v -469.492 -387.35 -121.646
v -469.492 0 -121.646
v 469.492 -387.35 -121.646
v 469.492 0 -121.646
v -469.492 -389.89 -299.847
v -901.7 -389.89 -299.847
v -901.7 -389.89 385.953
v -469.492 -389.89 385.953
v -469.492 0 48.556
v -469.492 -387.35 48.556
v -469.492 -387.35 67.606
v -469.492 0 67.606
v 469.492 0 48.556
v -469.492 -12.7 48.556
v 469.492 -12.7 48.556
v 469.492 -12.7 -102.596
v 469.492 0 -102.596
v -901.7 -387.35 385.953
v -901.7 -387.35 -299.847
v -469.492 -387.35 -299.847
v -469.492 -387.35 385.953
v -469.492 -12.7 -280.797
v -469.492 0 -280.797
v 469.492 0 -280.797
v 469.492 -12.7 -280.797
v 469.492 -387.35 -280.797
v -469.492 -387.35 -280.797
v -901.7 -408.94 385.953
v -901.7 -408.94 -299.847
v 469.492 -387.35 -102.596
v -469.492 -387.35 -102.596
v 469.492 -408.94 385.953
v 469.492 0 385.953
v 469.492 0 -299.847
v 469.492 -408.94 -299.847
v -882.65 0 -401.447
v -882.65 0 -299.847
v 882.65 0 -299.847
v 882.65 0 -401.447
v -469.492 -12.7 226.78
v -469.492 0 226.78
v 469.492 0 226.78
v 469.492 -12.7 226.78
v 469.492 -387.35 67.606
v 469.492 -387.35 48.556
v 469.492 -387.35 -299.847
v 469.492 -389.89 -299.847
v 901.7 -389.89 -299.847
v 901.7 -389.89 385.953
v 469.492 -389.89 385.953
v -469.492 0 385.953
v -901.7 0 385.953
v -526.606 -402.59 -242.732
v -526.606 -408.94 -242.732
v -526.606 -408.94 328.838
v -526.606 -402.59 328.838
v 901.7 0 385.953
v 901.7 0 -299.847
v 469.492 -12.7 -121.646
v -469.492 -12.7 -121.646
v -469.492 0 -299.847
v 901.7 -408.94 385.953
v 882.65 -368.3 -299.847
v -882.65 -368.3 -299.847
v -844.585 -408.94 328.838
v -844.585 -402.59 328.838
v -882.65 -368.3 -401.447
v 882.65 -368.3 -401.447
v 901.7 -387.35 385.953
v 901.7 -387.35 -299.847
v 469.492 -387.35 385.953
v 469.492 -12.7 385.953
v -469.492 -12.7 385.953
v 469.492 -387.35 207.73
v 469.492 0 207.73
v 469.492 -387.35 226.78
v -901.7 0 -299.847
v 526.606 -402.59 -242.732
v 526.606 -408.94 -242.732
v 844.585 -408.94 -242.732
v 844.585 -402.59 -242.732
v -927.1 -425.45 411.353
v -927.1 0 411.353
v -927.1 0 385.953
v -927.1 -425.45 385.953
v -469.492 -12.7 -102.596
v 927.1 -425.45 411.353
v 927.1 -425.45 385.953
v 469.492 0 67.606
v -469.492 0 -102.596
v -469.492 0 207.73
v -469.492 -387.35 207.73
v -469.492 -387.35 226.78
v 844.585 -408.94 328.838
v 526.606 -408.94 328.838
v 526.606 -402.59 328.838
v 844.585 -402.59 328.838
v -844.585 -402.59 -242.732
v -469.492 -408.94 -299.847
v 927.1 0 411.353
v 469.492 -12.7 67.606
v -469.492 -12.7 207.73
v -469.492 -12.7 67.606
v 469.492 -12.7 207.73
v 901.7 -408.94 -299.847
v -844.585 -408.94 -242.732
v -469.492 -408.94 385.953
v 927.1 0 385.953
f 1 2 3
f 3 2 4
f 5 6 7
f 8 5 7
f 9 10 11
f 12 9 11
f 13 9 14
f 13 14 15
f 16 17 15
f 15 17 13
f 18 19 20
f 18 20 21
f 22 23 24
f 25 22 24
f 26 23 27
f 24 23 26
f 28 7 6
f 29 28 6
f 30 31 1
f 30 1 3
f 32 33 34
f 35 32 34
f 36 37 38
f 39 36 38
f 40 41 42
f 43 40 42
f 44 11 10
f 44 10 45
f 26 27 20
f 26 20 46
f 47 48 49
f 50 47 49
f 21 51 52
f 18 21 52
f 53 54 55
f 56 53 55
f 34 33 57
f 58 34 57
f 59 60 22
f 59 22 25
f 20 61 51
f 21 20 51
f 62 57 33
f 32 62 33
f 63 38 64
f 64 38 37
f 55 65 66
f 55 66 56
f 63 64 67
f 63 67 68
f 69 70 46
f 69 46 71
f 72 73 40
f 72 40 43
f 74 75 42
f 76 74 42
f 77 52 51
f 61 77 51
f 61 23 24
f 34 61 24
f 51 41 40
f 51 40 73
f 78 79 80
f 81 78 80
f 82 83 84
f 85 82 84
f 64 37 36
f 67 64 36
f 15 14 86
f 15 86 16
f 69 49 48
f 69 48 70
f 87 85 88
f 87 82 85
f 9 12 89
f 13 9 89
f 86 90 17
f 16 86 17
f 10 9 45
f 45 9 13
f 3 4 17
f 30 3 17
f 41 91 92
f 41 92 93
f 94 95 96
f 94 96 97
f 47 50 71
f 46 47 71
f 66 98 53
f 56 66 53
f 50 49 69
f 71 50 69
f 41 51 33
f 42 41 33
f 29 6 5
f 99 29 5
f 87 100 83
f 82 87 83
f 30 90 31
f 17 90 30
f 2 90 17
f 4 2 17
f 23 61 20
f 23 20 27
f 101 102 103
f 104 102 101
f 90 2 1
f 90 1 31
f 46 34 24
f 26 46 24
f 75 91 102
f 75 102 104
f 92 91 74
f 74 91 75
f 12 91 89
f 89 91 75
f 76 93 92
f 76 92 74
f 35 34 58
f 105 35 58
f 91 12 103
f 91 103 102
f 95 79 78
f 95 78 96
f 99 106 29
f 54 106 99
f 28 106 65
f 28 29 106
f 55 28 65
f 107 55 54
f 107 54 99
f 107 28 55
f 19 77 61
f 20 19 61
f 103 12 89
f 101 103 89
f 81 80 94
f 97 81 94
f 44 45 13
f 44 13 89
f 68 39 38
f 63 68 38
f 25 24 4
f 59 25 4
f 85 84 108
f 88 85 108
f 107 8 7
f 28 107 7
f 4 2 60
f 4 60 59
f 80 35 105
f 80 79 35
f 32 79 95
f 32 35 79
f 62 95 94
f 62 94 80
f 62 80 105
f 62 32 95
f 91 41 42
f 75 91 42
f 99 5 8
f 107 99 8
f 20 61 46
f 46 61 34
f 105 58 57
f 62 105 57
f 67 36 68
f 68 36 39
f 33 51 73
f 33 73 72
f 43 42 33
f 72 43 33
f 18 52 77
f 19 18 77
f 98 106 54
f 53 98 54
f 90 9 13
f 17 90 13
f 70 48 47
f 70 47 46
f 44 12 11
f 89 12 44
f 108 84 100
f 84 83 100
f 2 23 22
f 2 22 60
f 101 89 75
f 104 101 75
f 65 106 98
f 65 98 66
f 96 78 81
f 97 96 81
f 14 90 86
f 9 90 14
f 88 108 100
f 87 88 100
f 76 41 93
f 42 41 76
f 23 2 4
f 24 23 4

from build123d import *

# Parameters (mm, degrees)
F0_W      = 317.978578
F0_H      = 571.570131
F1_DEPTH  = 408.94
F0_W_2    = 938.983108
F0_H_2    = 19.05
F2_DEPTH  = 387.35
F3_DEPTH  = 425.45
F4_W      = 2.54
F4_H      = 685.8
F5_DEPTH  = 432.208446
F6_W      = 2.54
F6_H      = 685.8
F7_DEPTH  = 432.208446
F8_DEPTH  = 368.3
F0_H_3    = 159.172786
F0_H_4    = 140.123955
F0_H_5    = 151.15178
F0_H_6    = 159.151479
F9_DEPTH  = 12.7
F10_W     = 317.978578
F10_H     = 571.570131
F11_DEPTH = 6.35


with BuildPart() as f1:
    # F0 (on Front) → F1 (new body)
    with BuildSketch(Plane.XZ):
        Polygon((-469.491554, 385.952815), (-901.7, 385.952815), (-901.7, -299.847185), (-882.65, -299.847185), (-469.491554, -299.847185), (-469.491554, -280.797185), (-469.491554, -121.645706), (-469.491554, -102.595706), (-469.491554, 48.556074), (-469.491554, 67.606074), (-469.491554, 207.730029), (-469.491554, 226.780029), align=None)
        with Locations((-685.595777, 43.052815)):
            Rectangle(F0_W, F0_H, mode=Mode.SUBTRACT)
        Polygon((901.7, 385.952815), (469.491554, 385.952815), (469.491554, 226.780029), (469.491554, 207.730029), (469.491554, 67.606074), (469.491554, 48.556074), (469.491554, -102.595706), (469.491554, -121.645706), (469.491554, -280.797185), (469.491554, -299.847185), (882.65, -299.847185), (901.7, -299.847185), align=None)
        with Locations((685.595777, 43.052815)):
            Rectangle(F0_W, F0_H, mode=Mode.SUBTRACT)
        with Locations((-685.595777, 43.052815)):
            Rectangle(F0_W, F0_H)
        with Locations((685.595777, 43.052815)):
            Rectangle(F0_W, F0_H)
    extrude(amount=F1_DEPTH)

    # F4 (on face) → F5 (cut, through all)
    with BuildSketch(Plane(origin=(-901.7, 0, 0), x_dir=(0, -1, 0), z_dir=(-1, 0, 0))):
        with Locations((388.62, 43.052815)):
            Rectangle(F4_W, F4_H)
    extrude(amount=-F5_DEPTH, mode=Mode.SUBTRACT)

    # F10 (on face) → F11 (cut)
    with BuildSketch(Plane.XZ.offset(408.94)):
        with Locations((685.595777, 43.052815)):
            Rectangle(F10_W, F10_H)
        with Locations((-685.595777, 43.052815)):
            Rectangle(F10_W, F10_H)
    extrude(amount=-F11_DEPTH, mode=Mode.SUBTRACT)


with BuildPart() as f2:
    # F0 (on Front) → F2 (new body)
    with BuildSketch(Plane.XZ):
        with Locations((0, 217.255029)):
            Rectangle(F0_W_2, F0_H_2)
        with Locations((0, 58.081074)):
            Rectangle(F0_W_2, F0_H_2)
        with Locations((0, -112.120706)):
            Rectangle(F0_W_2, F0_H_2)
        with Locations((0, -290.322185)):
            Rectangle(F0_W_2, F0_H_2)
    extrude(amount=F2_DEPTH)


with BuildPart() as f3:
    # F0 (on Front) → F3 (new body)
    with BuildSketch(Plane.XZ):
        Polygon((-927.1, 385.952815), (-901.7, 385.952815), (-469.491554, 385.952815), (469.491554, 385.952815), (901.7, 385.952815), (927.1, 385.952815), (927.1, 411.352815), (-927.1, 411.352815), align=None)
    extrude(amount=F3_DEPTH)


with BuildPart() as f7:
    # F6 (on face) → F7 (new body, through all)
    with BuildSketch(Plane.YZ.offset(901.7)):
        with Locations((-388.62, 43.052815)):
            Rectangle(F6_W, F6_H)
    extrude(amount=-F7_DEPTH)


with BuildPart() as f8:
    # F0 (on Front) → F8 (new body)
    with BuildSketch(Plane.XZ):
        Polygon((-469.491554, -299.847185), (-882.65, -299.847185), (-882.65, -401.447185), (882.65, -401.447185), (882.65, -299.847185), (469.491554, -299.847185), align=None)
    extrude(amount=F8_DEPTH)


with BuildPart() as f9:
    # F0 (on Front) → F9 (new body)
    with BuildSketch(Plane.XZ):
        with Locations((0, 306.366422)):
            Rectangle(F0_W_2, F0_H_3)
        with Locations((0, 137.668051)):
            Rectangle(F0_W_2, F0_H_4)
        with Locations((0, -27.019816)):
            Rectangle(F0_W_2, F0_H_5)
        with Locations((0, -201.221446)):
            Rectangle(F0_W_2, F0_H_6)
    extrude(amount=F9_DEPTH)


solid = Compound([f1.part, f2.part, f3.part, f7.part, f8.part, f9.part])
